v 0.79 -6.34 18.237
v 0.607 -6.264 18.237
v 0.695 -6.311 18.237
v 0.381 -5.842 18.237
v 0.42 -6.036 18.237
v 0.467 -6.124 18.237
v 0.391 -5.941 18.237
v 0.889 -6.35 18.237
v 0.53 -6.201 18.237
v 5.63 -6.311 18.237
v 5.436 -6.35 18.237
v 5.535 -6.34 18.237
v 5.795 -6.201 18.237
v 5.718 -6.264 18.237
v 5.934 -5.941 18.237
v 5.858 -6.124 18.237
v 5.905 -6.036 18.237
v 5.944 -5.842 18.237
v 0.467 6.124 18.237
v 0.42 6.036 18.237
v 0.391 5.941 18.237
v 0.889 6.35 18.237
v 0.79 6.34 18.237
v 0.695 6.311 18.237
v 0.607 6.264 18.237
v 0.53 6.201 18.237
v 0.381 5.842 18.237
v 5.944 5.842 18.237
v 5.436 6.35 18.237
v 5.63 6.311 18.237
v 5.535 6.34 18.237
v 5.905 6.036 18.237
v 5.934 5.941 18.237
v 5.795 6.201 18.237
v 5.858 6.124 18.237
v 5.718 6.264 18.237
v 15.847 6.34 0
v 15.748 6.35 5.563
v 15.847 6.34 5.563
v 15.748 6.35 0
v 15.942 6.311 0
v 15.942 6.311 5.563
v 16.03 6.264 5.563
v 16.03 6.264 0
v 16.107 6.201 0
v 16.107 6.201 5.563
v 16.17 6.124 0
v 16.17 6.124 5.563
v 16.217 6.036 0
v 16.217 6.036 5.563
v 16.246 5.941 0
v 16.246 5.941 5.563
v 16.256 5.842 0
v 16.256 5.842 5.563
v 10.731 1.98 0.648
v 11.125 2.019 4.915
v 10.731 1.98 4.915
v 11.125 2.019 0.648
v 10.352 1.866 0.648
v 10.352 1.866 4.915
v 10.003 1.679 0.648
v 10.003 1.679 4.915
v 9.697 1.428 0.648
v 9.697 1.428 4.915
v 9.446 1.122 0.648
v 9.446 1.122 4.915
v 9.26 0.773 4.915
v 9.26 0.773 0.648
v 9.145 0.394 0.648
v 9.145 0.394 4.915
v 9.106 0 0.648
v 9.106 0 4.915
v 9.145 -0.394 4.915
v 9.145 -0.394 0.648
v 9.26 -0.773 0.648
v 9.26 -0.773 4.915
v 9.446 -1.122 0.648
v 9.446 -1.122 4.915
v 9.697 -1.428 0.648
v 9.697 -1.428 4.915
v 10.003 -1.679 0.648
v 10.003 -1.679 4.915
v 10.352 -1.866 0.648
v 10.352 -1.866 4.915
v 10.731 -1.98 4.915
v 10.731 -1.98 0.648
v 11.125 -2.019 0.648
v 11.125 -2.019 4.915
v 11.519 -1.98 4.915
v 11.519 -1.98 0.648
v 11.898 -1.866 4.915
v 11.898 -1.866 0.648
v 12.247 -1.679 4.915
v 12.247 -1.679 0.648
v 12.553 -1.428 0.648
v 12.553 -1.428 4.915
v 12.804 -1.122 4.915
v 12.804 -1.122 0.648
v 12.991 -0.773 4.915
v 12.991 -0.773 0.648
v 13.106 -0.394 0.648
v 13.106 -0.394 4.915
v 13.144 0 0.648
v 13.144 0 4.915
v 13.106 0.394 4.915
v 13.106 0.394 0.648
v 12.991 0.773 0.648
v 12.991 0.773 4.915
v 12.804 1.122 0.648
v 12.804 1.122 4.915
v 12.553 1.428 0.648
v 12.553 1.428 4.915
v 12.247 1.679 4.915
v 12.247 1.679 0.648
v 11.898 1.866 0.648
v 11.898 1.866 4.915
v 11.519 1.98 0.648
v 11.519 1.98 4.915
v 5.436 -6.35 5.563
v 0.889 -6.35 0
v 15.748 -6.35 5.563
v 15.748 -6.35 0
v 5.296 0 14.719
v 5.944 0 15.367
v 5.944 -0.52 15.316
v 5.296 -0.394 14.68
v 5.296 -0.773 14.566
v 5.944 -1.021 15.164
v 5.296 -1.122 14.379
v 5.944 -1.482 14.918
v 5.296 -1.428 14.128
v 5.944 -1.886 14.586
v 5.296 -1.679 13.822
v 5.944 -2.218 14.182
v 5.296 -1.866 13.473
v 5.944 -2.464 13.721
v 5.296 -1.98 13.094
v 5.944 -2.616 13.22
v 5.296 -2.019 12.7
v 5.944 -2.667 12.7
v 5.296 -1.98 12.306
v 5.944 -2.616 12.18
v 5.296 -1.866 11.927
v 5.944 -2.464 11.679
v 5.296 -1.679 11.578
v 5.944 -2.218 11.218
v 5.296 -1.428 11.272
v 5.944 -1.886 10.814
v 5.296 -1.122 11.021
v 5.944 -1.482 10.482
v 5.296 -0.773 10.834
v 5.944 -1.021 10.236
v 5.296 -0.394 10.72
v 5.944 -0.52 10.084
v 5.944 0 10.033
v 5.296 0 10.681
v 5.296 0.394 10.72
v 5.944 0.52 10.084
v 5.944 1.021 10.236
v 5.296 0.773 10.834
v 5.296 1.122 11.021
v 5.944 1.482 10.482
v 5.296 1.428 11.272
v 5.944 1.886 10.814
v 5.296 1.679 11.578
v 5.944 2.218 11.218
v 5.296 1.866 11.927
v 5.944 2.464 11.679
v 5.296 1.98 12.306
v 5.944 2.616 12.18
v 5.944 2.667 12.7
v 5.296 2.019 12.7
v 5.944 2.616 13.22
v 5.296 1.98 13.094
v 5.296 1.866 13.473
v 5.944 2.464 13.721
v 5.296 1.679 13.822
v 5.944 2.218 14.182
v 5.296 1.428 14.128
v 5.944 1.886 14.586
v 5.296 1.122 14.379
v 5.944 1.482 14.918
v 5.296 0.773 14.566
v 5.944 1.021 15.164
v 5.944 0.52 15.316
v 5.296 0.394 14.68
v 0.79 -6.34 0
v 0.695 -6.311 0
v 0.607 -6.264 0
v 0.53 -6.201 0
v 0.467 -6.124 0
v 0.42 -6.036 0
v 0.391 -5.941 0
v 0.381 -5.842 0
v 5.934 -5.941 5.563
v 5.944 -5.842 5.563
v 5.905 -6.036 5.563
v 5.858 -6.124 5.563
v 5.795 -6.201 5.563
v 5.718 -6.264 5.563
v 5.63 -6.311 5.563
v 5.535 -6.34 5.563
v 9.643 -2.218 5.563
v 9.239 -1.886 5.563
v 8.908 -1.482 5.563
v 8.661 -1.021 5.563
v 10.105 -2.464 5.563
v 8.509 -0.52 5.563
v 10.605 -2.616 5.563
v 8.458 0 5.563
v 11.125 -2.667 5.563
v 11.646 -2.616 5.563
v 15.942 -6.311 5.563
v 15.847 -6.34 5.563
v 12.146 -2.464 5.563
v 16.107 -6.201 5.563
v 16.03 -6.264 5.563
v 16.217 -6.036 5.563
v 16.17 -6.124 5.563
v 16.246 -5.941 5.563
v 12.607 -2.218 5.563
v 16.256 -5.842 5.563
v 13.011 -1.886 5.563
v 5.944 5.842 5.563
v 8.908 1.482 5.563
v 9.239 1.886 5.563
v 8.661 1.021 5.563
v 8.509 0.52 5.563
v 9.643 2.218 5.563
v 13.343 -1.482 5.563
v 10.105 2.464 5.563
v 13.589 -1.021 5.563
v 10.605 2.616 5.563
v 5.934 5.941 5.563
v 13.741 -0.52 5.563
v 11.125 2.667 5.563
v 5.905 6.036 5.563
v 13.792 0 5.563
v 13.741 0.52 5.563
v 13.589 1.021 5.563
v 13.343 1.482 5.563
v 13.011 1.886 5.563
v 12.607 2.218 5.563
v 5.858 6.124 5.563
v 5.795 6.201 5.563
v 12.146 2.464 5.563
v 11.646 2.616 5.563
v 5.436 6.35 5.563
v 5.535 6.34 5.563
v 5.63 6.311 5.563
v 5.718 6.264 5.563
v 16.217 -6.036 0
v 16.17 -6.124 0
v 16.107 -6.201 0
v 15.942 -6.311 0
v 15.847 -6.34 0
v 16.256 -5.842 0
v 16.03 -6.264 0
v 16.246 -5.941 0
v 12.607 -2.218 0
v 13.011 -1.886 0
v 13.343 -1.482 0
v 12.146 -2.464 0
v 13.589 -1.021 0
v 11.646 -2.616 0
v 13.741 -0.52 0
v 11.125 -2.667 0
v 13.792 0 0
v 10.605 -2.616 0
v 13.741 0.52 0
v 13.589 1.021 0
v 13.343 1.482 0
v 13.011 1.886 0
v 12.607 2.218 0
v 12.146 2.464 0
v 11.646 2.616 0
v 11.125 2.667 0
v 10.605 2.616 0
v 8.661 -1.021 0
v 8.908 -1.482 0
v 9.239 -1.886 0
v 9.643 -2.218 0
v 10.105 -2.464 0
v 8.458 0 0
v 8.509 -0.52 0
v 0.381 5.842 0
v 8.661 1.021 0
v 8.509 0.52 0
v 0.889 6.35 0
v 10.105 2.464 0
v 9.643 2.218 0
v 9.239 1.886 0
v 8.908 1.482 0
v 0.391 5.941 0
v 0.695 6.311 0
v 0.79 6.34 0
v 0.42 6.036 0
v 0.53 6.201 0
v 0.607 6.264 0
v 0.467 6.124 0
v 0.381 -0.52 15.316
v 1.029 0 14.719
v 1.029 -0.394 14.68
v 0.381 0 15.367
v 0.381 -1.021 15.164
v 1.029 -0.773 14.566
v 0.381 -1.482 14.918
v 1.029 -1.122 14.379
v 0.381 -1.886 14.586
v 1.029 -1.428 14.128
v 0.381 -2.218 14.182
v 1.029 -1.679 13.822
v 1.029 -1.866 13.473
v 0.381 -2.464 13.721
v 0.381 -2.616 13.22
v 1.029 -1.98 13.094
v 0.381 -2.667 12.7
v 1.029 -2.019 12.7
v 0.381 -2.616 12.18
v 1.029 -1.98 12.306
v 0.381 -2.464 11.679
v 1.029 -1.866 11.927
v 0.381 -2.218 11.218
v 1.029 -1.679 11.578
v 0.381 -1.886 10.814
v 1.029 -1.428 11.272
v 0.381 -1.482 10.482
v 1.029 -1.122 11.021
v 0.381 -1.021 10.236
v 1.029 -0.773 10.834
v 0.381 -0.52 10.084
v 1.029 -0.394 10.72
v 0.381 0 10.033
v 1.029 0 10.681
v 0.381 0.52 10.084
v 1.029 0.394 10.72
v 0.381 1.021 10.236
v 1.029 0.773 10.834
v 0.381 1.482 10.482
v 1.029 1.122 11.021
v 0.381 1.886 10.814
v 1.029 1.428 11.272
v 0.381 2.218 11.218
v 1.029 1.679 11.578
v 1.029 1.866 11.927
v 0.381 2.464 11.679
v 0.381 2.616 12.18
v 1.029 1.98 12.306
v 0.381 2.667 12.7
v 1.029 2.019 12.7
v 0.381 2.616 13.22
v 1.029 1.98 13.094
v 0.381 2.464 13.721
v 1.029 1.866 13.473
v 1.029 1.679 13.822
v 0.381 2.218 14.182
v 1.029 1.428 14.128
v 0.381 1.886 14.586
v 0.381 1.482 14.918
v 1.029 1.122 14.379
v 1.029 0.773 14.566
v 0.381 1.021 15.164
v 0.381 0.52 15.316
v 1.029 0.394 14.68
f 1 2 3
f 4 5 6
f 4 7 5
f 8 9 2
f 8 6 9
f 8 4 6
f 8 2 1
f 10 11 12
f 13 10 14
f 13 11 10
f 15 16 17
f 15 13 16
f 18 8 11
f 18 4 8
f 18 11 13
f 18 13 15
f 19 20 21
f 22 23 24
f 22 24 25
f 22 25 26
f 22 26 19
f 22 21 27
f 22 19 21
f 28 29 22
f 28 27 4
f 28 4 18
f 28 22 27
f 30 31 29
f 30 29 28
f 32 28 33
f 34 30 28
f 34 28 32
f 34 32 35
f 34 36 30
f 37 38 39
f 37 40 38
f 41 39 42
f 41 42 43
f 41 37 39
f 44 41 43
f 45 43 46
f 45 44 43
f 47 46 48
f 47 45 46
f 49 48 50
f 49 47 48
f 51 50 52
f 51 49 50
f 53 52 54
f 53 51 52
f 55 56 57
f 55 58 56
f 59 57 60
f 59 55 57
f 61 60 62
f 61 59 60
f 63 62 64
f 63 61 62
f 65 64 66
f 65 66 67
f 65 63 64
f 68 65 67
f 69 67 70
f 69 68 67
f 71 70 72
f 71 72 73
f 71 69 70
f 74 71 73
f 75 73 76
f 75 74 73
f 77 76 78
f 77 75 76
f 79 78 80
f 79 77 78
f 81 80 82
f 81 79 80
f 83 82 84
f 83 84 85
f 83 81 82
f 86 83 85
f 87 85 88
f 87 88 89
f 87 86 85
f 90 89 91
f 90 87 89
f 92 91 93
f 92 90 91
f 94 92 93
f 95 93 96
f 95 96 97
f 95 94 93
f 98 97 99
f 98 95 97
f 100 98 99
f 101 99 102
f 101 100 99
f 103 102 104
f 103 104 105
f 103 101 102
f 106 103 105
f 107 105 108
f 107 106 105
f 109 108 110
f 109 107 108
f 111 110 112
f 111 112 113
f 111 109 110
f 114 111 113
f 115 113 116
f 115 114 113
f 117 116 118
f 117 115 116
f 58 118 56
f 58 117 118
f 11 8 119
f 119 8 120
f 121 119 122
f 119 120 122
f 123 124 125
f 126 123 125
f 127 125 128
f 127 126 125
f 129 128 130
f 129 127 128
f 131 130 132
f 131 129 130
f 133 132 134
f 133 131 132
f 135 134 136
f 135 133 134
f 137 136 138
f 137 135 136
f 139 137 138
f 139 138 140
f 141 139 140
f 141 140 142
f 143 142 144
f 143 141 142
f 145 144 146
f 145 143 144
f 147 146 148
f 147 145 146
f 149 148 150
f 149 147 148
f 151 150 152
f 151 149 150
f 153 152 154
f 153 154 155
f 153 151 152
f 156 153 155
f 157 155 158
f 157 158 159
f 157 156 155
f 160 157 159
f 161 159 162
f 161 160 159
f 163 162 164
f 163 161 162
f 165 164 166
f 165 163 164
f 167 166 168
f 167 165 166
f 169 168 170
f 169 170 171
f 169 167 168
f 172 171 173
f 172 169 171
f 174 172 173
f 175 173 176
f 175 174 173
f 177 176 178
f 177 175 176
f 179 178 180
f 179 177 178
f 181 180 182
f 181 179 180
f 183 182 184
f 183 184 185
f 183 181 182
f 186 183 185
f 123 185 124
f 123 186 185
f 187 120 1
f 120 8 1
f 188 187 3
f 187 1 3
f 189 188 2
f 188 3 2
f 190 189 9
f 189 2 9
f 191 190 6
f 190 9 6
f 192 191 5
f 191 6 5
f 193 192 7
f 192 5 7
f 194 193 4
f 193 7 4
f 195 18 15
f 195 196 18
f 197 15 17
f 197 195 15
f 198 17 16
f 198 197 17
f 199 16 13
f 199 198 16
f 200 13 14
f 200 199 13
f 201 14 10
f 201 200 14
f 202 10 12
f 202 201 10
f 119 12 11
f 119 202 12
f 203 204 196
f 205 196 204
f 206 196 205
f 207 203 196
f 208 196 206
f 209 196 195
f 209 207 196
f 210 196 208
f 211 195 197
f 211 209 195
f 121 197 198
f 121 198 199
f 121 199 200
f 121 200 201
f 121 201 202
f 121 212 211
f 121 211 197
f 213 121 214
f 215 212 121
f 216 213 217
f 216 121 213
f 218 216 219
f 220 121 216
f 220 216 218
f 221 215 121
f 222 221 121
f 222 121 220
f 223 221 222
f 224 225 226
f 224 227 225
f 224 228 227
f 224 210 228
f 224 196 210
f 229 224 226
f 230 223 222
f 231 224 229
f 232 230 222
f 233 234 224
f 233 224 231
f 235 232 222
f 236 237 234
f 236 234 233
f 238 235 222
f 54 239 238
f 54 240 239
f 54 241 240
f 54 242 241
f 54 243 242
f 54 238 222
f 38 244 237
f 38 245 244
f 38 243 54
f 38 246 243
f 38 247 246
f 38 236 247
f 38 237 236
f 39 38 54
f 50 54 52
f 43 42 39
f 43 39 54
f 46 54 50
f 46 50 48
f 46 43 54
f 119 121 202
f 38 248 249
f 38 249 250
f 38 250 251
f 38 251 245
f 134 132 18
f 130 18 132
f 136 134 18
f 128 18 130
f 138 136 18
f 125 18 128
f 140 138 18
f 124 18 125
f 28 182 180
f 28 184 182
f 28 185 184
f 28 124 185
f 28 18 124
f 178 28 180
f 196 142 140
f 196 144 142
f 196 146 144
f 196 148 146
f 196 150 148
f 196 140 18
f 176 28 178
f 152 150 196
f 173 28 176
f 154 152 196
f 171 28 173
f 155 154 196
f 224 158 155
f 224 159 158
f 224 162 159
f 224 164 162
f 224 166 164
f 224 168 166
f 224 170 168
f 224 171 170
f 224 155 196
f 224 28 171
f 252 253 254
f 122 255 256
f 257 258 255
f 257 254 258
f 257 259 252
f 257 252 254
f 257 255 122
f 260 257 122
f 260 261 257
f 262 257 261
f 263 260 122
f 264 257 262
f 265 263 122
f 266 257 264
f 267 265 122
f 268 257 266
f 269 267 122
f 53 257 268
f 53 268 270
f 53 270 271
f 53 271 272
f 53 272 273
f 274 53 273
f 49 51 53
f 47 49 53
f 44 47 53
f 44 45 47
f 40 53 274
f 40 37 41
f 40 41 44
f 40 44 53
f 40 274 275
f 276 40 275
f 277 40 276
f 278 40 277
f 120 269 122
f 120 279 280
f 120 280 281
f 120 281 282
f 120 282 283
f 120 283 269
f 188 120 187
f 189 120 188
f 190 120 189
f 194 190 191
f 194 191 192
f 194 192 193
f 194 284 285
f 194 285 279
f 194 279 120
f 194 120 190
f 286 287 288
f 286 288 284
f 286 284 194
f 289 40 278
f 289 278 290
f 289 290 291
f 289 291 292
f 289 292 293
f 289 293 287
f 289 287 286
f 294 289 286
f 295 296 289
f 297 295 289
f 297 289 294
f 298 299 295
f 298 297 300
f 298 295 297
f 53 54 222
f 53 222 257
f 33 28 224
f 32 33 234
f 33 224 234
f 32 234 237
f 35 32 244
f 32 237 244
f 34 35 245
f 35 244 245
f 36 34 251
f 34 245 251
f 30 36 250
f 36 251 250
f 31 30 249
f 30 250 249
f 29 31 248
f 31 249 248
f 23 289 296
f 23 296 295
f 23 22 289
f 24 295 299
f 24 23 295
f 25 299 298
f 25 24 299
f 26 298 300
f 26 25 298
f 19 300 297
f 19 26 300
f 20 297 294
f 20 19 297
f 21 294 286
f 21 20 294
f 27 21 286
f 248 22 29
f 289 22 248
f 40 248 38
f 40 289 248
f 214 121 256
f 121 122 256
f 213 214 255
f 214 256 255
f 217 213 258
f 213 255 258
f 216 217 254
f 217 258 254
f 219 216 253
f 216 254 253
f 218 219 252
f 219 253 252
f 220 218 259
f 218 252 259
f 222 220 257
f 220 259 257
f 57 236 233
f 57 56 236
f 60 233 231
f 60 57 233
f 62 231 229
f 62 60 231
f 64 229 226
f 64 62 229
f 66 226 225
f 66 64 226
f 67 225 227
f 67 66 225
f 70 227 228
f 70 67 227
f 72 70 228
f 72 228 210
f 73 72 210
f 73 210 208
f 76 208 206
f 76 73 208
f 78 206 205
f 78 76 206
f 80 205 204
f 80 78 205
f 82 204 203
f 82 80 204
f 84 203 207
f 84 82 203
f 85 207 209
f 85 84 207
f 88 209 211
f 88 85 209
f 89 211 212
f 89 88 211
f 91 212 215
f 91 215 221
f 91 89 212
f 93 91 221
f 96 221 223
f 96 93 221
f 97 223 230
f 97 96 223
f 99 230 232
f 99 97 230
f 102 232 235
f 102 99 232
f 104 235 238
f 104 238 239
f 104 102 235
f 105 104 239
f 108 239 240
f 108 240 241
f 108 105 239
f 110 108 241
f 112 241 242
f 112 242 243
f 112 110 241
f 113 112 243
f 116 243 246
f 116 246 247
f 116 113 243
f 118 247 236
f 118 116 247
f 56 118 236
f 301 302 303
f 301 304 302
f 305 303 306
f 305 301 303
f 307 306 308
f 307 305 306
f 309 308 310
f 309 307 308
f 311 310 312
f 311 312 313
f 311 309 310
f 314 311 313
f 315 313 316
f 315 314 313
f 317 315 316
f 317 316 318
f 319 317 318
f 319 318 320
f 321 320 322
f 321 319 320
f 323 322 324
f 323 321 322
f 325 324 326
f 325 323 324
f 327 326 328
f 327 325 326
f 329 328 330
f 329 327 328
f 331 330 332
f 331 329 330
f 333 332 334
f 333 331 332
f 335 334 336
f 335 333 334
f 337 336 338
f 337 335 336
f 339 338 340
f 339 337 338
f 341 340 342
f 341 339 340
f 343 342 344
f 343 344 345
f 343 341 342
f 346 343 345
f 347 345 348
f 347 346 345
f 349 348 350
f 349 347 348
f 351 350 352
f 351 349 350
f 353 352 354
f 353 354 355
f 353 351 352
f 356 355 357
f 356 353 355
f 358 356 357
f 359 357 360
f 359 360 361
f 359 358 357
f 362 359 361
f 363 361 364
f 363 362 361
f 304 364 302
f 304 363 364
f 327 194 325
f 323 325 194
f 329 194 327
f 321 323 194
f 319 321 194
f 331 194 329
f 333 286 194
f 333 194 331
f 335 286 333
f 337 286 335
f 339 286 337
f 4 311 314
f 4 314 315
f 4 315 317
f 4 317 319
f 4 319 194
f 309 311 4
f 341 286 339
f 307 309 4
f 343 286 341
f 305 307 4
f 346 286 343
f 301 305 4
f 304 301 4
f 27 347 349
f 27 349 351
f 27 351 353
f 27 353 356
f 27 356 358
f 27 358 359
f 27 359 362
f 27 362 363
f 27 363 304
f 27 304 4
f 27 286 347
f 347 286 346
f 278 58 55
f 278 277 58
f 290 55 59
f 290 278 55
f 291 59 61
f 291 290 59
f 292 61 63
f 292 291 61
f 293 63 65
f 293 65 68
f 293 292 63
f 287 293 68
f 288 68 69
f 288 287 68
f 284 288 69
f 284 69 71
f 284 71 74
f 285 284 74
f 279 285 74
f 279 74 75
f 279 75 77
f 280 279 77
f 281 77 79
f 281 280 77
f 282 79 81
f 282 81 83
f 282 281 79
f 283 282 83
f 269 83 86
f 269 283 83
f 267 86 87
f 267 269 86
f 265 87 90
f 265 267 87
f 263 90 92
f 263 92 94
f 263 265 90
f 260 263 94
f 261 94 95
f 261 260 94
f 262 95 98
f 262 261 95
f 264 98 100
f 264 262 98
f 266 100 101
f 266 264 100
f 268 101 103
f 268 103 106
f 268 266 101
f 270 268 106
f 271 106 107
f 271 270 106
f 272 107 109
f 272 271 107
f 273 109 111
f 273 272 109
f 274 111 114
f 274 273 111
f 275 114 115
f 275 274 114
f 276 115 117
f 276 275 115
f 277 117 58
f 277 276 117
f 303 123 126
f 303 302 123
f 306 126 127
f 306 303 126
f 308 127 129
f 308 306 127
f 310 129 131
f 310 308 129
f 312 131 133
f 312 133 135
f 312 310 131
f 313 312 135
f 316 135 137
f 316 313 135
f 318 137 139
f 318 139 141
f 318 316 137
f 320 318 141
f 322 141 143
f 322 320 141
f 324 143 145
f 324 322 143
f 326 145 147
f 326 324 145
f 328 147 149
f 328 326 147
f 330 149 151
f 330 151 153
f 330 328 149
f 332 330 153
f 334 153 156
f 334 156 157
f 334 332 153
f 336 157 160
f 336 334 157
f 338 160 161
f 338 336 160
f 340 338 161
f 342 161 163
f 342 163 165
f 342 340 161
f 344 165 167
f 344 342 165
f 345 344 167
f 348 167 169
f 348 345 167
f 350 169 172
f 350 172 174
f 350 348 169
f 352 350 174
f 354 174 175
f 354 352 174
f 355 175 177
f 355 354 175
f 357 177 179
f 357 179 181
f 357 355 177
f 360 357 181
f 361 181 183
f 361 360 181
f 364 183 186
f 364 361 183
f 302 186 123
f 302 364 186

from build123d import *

# Parameters (mm, degrees)
EXTRUDE1_DEPTH = 6.35
FILLET1_R      = 0.508


with BuildPart() as part:
    # Sketch1 → Extrude1 (new, symmetric)
    with BuildSketch(Plane(origin=(0, 0, 0), x_dir=(1, 0, 0), z_dir=(0, 1, 0))):
        Polygon((5.9436, -18.2372), (5.9436, -5.5626), (16.256, -5.5626), (16.256, 0), (0.381, 0), (0.381, -18.2372), align=None)
    extrude(amount=EXTRUDE1_DEPTH, both=True)

    # Sketch2 → #10-32 Tapped Hole2 (revolve, cut)
    with BuildSketch(Plane(origin=(0.381, 0, 12.7), x_dir=(0, 0, 1), z_dir=(0, 1, 0))):
        Polygon((0, 0), (0, 5.5626), (2.667, 5.5626), (2.0193, 4.9149), (2.0193, 0.6477), (2.667, 0), align=None)
    revolve(axis=Axis((-5.969, 0, 12.7), (1, 0, 0)), mode=Mode.SUBTRACT)

    # Sketch4 → #10-32 Tapped Hole1 (revolve, cut)
    with BuildSketch(Plane.YZ.offset(11.1252)):
        Polygon((0, 0), (0, 5.5626), (2.667, 5.5626), (2.0193, 4.9149), (2.0193, 0.6477), (2.667, 0), align=None)
    revolve(axis=Axis((11.1252, 0, -6.35), (0, 0, 1)), mode=Mode.SUBTRACT)

    # Fillet1
    fillet1_edges = [part.edges().sort_by_distance(p)[0] for p in [
        (5.9436, 6.35, 11.8999),
        (16.256, 6.35, 2.7813),
        (0.381, 6.35, 9.1186),
        (16.256, -6.35, 2.7813),
        (5.9436, -6.35, 11.8999),
        (0.381, -6.35, 9.1186),
    ]]
    fillet(fillet1_edges, radius=FILLET1_R)


solid = part.part
